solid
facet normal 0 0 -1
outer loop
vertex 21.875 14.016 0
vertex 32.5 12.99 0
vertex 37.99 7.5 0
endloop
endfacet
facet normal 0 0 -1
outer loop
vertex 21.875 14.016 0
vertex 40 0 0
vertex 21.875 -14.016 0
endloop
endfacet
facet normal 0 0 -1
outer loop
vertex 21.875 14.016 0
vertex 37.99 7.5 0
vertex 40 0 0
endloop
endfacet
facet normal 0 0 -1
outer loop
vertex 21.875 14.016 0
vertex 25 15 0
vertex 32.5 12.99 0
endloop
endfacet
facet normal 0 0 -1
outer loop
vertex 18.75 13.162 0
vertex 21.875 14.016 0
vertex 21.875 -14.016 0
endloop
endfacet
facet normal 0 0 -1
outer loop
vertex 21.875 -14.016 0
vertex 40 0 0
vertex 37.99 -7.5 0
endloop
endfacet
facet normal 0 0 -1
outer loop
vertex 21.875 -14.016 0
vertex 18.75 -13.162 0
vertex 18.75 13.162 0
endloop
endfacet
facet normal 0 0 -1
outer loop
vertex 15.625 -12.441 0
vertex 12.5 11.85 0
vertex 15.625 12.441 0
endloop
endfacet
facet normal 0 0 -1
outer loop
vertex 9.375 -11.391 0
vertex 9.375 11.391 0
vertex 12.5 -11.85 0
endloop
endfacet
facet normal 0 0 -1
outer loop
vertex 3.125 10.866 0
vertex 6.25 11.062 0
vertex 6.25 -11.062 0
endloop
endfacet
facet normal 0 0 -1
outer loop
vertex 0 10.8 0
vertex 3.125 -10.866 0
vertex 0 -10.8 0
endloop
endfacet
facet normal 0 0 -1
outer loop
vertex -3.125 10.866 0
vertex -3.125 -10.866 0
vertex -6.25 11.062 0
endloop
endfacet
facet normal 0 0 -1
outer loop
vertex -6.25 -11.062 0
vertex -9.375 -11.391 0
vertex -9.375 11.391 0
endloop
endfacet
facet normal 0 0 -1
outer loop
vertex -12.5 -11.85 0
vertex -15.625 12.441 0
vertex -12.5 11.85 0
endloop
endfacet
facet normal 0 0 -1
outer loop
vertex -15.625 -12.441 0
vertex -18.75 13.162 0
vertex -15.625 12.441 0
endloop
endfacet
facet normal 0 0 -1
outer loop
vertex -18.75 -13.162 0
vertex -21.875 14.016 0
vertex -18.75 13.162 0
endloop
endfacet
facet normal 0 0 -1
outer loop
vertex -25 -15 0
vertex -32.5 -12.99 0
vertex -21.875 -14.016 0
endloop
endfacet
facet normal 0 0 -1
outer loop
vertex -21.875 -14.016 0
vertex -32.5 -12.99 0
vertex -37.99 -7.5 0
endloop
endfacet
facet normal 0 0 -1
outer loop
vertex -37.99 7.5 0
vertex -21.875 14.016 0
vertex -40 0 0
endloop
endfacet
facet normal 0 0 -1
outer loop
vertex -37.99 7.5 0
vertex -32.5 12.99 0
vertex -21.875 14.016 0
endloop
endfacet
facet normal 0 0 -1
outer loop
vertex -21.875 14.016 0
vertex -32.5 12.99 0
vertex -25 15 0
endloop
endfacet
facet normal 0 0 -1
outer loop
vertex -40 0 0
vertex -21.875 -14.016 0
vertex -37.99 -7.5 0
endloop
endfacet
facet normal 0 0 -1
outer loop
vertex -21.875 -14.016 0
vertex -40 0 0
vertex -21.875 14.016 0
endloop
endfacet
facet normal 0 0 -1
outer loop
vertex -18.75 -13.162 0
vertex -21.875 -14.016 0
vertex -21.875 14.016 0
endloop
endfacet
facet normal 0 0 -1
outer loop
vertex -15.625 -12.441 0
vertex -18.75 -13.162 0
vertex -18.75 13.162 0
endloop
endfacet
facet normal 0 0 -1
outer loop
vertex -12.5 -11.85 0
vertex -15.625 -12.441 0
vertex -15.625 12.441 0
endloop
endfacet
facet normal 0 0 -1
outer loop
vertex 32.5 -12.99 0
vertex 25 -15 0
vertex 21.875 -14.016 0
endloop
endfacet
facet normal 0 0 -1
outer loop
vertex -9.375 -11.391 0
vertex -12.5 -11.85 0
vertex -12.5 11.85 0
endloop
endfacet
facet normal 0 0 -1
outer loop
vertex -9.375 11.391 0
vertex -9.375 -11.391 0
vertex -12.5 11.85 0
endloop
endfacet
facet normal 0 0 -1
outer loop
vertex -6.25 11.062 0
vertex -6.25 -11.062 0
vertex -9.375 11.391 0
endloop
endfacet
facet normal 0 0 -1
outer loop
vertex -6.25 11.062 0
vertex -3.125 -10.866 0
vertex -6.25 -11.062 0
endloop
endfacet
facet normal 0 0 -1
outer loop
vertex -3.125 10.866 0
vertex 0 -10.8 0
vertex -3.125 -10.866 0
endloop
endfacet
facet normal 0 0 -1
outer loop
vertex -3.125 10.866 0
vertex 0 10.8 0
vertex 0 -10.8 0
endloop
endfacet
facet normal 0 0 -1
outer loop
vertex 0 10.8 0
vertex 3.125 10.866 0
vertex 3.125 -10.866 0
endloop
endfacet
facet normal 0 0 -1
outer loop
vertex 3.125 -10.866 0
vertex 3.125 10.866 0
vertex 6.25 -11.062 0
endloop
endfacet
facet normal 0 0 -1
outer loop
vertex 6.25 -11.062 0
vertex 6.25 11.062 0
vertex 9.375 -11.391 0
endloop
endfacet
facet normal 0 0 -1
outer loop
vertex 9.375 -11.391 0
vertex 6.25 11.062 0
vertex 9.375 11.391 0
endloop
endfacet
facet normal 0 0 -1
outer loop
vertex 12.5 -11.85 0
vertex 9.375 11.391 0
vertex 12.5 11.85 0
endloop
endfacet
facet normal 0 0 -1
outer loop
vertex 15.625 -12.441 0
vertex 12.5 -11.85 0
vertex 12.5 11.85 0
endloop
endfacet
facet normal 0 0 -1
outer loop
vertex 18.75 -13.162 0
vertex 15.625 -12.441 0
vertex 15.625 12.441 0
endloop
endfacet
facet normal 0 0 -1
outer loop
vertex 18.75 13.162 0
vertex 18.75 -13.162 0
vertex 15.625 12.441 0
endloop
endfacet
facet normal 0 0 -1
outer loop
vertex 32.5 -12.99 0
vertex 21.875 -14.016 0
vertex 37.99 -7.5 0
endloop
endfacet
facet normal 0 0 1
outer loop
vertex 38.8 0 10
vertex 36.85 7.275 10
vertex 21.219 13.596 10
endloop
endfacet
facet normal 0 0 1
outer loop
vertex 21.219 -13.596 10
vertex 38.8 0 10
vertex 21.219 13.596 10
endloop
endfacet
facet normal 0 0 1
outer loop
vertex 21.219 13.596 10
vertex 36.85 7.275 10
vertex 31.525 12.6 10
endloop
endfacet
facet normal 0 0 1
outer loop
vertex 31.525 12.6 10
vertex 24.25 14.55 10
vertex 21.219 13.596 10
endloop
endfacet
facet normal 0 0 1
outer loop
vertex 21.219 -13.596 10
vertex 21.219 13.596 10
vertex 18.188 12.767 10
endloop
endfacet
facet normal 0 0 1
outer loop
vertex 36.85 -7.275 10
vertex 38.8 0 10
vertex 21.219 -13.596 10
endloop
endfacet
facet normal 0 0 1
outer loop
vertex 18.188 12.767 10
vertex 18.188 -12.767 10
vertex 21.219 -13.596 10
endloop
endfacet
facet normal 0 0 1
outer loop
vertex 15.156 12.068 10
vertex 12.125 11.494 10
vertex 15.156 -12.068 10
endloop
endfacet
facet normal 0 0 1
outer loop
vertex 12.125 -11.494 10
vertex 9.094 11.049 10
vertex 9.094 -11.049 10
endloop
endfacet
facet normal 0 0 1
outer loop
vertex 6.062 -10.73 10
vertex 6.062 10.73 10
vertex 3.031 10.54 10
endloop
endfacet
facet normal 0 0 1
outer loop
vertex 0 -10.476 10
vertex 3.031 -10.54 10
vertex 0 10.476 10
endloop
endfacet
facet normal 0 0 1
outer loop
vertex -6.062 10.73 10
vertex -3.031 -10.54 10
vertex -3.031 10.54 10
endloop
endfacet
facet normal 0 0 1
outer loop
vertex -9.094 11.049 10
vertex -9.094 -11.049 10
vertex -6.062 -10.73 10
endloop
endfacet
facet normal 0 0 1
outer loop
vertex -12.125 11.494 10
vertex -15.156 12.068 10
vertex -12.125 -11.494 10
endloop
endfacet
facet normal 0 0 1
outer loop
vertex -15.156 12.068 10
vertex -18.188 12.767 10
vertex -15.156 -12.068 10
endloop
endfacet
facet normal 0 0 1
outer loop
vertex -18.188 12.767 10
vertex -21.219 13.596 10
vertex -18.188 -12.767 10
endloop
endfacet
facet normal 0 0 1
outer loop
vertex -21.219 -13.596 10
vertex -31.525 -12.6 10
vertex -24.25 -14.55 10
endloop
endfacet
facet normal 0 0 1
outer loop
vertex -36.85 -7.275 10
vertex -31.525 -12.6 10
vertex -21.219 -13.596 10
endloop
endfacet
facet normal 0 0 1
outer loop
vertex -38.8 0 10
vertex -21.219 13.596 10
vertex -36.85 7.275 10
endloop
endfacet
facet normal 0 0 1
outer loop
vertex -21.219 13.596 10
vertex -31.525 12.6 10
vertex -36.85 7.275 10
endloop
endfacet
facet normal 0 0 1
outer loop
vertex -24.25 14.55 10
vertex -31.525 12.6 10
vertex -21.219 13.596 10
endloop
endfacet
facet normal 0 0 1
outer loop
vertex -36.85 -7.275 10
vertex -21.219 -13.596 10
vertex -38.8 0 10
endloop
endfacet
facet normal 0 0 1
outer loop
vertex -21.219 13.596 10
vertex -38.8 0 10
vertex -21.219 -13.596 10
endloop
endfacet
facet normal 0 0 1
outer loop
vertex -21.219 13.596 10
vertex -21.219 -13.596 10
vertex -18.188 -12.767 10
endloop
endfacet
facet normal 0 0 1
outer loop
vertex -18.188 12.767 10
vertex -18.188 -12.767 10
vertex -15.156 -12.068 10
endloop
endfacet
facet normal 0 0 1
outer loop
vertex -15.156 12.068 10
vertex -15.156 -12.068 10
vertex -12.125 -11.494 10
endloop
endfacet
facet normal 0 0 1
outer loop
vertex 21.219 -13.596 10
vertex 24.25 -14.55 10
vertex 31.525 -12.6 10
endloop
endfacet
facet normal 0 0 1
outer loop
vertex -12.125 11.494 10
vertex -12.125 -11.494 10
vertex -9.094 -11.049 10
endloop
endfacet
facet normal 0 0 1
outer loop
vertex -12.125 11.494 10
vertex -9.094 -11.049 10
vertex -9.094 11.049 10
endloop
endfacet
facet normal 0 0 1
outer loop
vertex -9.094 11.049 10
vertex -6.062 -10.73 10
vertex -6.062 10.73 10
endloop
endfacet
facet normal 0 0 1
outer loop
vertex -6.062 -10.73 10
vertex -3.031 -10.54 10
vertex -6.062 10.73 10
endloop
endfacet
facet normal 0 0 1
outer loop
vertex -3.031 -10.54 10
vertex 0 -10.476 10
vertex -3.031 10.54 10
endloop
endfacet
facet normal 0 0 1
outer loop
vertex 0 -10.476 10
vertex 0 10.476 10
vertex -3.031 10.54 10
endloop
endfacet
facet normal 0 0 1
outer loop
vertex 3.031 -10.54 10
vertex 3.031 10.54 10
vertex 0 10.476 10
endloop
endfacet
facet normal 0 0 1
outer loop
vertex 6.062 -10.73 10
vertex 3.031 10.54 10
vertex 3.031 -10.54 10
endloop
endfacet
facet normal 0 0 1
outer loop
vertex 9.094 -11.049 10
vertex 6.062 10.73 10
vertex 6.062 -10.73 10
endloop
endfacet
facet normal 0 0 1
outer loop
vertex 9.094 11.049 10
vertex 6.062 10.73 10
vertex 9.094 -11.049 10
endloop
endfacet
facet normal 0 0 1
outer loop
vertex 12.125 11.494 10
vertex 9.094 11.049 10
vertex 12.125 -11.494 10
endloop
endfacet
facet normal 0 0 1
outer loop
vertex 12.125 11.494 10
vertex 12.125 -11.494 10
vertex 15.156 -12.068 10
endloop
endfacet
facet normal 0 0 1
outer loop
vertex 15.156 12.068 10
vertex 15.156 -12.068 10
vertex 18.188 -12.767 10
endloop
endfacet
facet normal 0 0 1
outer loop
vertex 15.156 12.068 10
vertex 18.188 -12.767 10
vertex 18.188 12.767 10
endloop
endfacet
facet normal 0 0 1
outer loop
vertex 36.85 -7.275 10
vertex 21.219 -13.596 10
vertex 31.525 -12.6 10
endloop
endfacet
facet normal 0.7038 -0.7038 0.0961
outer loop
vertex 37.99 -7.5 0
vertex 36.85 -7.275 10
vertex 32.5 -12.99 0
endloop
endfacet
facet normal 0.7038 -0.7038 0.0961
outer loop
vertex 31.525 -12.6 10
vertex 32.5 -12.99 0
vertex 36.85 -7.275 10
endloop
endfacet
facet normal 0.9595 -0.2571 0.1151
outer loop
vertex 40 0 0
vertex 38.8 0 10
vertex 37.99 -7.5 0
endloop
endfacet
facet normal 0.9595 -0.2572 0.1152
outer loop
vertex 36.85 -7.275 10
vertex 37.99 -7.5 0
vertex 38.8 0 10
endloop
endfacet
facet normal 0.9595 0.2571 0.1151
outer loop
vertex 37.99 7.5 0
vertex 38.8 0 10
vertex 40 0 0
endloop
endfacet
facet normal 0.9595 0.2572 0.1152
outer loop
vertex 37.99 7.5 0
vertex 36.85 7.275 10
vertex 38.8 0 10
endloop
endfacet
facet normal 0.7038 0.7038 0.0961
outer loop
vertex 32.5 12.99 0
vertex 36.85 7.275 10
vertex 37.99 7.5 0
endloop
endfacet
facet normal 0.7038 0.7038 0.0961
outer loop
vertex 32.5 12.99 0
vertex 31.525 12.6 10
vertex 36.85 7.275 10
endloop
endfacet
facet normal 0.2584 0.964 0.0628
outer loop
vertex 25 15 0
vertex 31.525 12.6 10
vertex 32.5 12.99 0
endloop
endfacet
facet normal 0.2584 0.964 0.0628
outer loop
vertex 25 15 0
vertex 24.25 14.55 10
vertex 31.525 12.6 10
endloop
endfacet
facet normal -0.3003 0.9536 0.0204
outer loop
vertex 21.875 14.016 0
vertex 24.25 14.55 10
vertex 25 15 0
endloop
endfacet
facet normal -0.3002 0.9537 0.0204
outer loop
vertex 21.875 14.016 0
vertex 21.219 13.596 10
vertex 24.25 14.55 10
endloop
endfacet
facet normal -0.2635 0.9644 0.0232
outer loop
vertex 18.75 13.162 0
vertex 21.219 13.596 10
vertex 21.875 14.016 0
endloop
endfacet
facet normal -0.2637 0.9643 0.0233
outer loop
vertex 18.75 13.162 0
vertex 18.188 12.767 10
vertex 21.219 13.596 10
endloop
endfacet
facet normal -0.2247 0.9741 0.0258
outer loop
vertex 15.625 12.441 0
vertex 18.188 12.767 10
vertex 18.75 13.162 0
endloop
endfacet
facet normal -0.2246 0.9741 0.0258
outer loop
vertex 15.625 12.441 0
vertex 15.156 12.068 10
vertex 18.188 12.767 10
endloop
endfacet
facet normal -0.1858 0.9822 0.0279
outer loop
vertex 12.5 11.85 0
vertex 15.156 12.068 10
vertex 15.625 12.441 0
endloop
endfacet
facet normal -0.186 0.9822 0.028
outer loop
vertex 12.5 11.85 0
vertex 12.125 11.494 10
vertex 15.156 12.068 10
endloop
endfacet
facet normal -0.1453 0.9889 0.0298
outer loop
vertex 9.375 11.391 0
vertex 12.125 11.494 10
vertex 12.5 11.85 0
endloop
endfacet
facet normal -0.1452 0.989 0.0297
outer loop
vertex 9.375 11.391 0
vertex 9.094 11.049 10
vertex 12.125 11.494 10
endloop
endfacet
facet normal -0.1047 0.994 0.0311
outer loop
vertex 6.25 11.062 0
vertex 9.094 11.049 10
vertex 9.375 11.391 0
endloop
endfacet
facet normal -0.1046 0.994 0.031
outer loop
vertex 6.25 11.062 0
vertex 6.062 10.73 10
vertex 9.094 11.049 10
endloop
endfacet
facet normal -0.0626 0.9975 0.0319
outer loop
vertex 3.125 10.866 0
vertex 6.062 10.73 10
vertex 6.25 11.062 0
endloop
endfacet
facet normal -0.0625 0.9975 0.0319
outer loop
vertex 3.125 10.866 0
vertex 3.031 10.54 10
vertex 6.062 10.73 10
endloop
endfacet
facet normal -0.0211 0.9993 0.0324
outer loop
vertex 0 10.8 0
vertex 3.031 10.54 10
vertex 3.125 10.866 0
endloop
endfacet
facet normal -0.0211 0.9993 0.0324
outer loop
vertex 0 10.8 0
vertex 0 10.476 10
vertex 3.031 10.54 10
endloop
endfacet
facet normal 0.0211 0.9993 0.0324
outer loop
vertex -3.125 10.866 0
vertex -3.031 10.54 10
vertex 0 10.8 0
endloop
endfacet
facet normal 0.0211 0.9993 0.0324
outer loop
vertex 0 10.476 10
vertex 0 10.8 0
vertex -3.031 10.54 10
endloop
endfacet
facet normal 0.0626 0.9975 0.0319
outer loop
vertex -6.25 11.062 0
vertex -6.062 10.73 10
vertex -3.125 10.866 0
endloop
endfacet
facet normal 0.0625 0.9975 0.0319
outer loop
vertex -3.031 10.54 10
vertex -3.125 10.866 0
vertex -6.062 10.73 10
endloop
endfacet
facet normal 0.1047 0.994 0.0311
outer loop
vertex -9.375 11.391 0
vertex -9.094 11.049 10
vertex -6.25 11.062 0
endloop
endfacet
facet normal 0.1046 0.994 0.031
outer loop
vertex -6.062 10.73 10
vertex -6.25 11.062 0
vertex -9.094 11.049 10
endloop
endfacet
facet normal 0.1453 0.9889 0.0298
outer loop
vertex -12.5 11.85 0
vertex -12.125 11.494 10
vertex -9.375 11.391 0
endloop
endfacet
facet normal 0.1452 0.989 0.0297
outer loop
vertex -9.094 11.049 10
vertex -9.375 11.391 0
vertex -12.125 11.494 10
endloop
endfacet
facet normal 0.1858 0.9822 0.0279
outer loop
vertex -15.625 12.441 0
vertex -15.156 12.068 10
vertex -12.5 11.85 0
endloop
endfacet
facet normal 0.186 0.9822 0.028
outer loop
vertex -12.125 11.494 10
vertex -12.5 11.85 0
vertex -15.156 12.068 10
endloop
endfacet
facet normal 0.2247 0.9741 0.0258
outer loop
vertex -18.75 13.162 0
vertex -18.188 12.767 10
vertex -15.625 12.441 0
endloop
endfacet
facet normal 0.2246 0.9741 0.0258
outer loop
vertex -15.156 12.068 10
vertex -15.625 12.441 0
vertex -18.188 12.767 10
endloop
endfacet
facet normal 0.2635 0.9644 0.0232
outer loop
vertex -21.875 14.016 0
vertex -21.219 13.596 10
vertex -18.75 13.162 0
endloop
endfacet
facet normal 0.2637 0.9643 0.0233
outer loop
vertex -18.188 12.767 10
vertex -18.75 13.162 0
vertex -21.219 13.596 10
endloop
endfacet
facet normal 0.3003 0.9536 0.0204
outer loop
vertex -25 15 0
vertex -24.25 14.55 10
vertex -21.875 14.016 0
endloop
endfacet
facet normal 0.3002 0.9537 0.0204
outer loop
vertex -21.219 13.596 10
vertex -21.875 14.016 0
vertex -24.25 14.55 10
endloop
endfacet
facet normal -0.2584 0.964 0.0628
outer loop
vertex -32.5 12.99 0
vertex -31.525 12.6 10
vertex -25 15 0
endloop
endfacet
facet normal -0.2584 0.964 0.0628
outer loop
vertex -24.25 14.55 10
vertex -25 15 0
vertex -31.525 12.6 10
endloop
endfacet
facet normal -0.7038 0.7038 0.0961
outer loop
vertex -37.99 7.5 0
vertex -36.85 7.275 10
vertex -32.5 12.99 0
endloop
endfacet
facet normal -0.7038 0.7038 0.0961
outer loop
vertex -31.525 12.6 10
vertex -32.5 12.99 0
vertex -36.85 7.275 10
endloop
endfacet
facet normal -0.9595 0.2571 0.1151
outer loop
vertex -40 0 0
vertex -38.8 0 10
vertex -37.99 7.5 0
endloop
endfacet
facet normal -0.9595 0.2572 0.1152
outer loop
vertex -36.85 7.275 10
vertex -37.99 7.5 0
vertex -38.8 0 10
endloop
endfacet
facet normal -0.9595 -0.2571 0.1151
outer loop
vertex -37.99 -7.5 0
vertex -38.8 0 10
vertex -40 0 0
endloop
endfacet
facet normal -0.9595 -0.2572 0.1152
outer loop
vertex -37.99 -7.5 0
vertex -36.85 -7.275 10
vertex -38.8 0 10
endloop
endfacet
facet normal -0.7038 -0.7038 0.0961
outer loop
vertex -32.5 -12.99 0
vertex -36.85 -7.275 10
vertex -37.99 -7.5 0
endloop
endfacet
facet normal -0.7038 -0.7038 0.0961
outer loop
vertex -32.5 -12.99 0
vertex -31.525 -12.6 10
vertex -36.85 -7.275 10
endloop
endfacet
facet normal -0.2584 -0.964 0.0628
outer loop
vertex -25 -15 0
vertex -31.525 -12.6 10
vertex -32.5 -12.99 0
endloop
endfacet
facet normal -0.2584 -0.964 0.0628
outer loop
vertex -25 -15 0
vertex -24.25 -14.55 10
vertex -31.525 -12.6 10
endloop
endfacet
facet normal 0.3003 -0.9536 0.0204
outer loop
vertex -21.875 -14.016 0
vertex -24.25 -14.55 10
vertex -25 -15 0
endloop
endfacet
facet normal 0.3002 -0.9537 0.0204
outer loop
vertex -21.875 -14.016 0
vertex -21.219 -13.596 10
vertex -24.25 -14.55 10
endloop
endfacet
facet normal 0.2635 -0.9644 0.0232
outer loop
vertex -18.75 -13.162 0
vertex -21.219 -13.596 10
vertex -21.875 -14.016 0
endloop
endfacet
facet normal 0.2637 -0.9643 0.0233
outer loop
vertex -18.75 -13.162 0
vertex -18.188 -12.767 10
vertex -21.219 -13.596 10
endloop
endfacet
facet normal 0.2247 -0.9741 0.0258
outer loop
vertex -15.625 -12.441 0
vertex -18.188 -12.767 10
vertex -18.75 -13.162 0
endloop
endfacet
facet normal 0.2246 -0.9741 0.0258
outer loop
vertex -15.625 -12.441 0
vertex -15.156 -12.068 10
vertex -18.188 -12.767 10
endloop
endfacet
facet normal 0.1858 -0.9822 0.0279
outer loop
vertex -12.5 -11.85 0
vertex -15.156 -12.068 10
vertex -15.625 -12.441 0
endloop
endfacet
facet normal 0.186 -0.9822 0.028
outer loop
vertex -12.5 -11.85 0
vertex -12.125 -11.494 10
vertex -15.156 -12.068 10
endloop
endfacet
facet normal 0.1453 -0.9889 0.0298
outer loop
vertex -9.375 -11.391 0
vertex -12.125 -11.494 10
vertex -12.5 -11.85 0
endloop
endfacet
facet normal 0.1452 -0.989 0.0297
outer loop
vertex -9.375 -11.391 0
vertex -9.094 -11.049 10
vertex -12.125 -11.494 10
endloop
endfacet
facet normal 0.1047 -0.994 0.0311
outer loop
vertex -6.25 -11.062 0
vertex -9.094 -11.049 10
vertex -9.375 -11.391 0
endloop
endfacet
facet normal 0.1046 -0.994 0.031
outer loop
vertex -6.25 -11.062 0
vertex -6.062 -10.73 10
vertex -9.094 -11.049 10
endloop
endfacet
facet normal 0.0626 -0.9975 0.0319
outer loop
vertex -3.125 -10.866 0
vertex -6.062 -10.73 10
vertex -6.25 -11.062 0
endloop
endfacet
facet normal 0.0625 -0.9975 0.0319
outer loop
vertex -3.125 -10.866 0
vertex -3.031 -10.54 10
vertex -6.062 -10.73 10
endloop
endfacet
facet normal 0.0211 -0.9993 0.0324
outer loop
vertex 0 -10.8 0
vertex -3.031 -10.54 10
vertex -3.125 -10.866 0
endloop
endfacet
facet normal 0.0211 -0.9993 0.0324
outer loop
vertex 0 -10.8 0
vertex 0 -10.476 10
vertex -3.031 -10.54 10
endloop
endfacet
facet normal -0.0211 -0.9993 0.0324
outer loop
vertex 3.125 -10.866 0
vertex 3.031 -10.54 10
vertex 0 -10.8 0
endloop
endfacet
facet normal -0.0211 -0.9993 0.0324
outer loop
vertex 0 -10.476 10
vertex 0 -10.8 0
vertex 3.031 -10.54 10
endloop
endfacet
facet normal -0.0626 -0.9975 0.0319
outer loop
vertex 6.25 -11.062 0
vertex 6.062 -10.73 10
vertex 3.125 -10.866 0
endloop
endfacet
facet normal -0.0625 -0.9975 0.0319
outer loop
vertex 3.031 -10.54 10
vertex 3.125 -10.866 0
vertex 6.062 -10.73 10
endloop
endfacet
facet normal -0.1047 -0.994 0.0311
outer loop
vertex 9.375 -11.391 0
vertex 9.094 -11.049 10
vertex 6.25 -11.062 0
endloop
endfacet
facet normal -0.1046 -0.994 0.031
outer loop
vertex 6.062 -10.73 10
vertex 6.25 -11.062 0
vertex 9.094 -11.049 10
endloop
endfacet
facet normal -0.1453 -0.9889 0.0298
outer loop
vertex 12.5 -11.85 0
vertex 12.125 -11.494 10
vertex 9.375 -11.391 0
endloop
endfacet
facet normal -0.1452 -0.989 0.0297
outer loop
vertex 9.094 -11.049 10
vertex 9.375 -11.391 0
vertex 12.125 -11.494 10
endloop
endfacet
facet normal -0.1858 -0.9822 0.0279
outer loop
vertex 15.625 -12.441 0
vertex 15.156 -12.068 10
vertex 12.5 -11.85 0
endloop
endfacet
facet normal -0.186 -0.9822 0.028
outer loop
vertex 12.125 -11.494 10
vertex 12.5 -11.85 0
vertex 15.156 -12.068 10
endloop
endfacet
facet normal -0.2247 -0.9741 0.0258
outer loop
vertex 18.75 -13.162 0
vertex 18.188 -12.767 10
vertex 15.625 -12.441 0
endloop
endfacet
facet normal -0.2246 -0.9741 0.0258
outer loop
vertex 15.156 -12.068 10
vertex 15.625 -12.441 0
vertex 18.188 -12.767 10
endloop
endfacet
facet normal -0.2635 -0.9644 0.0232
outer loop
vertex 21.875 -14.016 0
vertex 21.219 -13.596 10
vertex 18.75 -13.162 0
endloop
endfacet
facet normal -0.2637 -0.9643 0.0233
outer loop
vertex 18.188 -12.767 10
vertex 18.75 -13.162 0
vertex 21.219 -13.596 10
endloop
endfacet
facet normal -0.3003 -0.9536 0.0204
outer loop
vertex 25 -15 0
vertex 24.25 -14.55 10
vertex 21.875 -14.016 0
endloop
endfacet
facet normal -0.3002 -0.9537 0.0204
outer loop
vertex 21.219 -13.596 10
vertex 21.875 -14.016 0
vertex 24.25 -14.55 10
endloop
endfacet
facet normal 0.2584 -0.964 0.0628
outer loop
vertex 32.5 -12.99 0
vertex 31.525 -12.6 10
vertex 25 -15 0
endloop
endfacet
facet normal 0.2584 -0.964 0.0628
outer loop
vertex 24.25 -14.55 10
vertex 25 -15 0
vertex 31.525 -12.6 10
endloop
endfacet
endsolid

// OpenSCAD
$fn = 32;

// ----------------------------------------------------------------------
// Handle: 80 x 30 mm grip, 10 mm thick
// ----------------------------------------------------------------------

// --- parameters (mm) ---
length = 80;              // grip length
width = 30;               // grip width
thickness = 10;           // grip thickness
waist = 0.72;             // width factor at the middle
draft = 0.97;             // top face scale of the extrusion

/* ergonomic grip outline, closed spline-like polygon in the XY plane */
grip = [[-25, 15], [-21.875, 14.016], [-18.75, 13.162], [-15.625, 12.441], [-12.5, 11.85], [-9.375, 11.391], [-6.25, 11.062], [-3.125, 10.866], [0, 10.8], [3.125, 10.866], [6.25, 11.062], [9.375, 11.391], [12.5, 11.85], [15.625, 12.441], [18.75, 13.162], [21.875, 14.016], [25, 15], [32.5, 12.99], [37.99, 7.5], [40, 0], [37.99, -7.5], [32.5, -12.99], [25, -15], [25, -15], [21.875, -14.016], [18.75, -13.162], [15.625, -12.441], [12.5, -11.85], [9.375, -11.391], [6.25, -11.062], [3.125, -10.866], [0, -10.8], [-3.125, -10.866], [-6.25, -11.062], [-9.375, -11.391], [-12.5, -11.85], [-15.625, -12.441], [-18.75, -13.162], [-21.875, -14.016], [-25, -15], [-32.5, -12.99], [-37.99, -7.5], [-40, 0], [-37.99, 7.5], [-32.5, 12.99], [-25, 15]];

module grip_body() {
  linear_extrude(height = thickness, scale = draft) polygon(grip);
}

difference() {
  union() {
    grip_body();
  }
}
